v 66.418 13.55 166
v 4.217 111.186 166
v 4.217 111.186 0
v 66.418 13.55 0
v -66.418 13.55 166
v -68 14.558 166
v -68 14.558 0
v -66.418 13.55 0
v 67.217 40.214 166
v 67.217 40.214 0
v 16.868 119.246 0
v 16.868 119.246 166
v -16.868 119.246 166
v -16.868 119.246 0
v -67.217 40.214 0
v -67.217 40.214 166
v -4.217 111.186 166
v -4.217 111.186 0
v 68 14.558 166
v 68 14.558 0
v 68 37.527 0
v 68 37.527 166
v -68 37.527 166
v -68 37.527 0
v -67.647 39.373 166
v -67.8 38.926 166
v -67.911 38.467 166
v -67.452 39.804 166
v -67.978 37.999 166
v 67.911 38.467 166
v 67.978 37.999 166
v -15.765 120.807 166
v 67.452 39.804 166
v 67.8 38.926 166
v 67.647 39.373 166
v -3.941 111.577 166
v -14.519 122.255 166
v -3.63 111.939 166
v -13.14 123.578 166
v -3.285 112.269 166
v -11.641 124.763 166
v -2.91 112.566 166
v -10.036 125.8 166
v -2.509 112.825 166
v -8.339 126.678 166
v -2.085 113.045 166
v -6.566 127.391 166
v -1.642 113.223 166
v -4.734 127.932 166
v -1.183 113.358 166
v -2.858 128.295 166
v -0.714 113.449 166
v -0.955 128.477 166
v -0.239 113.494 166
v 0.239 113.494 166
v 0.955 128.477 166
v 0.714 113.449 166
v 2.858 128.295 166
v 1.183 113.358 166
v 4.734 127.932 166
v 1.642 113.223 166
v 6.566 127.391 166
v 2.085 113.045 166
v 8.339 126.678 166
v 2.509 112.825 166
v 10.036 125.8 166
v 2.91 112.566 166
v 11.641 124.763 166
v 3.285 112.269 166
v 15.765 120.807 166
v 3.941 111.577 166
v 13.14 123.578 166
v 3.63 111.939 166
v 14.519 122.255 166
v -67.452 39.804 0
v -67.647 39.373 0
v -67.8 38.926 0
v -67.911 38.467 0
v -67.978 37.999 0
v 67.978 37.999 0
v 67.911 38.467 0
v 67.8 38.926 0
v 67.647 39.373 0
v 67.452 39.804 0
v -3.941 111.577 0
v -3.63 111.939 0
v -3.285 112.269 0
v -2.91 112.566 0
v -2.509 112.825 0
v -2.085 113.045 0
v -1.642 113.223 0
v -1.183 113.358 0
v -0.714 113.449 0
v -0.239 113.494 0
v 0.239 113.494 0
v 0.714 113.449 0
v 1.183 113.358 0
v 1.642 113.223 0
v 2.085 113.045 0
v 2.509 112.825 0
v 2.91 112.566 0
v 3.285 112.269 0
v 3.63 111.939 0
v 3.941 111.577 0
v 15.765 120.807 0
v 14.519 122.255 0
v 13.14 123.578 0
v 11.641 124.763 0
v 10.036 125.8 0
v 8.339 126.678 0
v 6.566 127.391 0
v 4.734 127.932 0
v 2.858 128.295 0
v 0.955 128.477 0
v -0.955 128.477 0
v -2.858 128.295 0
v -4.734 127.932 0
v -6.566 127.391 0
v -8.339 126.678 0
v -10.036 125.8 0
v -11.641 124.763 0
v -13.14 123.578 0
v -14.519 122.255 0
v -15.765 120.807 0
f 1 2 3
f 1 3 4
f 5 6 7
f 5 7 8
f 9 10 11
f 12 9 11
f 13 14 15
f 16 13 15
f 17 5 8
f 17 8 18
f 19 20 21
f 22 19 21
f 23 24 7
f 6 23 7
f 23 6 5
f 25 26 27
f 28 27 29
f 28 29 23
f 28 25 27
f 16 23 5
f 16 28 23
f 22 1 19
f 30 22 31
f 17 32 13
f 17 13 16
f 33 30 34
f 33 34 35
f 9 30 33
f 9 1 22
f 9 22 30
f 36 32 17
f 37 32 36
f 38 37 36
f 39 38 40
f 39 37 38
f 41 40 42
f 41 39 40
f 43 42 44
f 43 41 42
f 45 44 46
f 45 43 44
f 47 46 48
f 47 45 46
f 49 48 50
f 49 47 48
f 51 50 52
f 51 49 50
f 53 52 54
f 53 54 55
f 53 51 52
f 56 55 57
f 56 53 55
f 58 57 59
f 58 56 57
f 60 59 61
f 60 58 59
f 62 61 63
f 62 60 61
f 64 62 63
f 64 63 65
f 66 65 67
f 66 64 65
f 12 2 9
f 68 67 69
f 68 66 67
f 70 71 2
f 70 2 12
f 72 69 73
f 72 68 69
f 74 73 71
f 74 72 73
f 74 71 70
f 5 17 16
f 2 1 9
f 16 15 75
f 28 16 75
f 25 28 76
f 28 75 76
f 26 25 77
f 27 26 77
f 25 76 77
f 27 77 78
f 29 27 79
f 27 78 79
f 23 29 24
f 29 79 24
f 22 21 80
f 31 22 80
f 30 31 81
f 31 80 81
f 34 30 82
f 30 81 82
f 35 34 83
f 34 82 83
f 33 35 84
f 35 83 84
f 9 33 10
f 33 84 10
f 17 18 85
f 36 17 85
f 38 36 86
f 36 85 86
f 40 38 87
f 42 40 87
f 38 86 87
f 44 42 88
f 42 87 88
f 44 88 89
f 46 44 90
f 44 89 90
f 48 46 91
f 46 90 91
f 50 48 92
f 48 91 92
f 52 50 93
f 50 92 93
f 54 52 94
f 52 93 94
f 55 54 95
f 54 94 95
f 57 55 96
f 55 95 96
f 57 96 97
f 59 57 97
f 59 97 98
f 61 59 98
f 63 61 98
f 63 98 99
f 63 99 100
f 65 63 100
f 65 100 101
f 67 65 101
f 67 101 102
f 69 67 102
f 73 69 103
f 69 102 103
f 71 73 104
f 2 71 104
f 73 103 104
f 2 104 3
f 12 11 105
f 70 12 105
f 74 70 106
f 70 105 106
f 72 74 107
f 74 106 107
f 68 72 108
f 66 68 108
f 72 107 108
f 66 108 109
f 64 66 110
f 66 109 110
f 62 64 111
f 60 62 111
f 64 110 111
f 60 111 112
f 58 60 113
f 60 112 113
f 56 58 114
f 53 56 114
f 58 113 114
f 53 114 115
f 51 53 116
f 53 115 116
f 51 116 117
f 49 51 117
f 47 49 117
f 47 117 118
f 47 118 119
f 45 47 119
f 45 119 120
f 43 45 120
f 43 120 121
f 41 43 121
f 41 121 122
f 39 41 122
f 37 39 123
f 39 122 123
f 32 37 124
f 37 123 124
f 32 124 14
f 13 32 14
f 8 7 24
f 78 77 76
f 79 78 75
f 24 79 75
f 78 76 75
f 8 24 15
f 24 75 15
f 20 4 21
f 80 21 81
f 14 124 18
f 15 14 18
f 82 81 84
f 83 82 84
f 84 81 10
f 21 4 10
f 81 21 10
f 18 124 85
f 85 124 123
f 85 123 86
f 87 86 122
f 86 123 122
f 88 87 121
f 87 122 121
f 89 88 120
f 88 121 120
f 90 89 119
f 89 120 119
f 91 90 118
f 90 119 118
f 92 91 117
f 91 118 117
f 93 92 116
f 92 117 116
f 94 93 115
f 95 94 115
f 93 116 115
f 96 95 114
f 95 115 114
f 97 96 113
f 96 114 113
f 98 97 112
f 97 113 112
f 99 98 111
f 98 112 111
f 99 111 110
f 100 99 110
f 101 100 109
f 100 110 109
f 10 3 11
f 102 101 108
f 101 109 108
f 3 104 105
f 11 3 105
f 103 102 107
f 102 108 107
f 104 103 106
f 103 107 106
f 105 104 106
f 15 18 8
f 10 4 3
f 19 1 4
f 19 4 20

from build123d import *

# Parameters (mm, degrees)
BOSS_EXTRUDE1_DEPTH = 166


with BuildPart() as part:
    # Sketch1 → Boss-Extrude1 (new body)
    with BuildSketch(Plane.XY):
        with BuildLine():
            Line((-68, 14.557655487), (-66.418275512, 13.549985855))
            Line((-66.418275512, 13.549985855), (-4.216957229, 111.186498042))
            ThreePointArc((-4.216957229, 111.186498042), (0, 113.5), (4.216957229, 111.186498042))
            Line((4.216957229, 111.186498042), (66.418275512, 13.549985855))
            Line((66.418275512, 13.549985855), (68, 14.557655487))
            Line((68, 14.557655487), (68, 37.527193592))
            ThreePointArc((68, 37.527193592), (67.800249272, 38.926338662), (67.216957229, 40.213691634))
            Line((67.216957229, 40.213691634), (16.867828916, 119.245992167))
            ThreePointArc((16.867828916, 119.245992167), (0, 128.5), (-16.867828916, 119.245992167))
            Line((-16.867828916, 119.245992167), (-67.216957229, 40.213691634))
            ThreePointArc((-67.216957229, 40.213691634), (-67.800249272, 38.926338662), (-68, 37.527193592))
            Line((-68, 37.527193592), (-68, 14.557655487))
        make_face()
    extrude(amount=BOSS_EXTRUDE1_DEPTH)


solid = part.part
